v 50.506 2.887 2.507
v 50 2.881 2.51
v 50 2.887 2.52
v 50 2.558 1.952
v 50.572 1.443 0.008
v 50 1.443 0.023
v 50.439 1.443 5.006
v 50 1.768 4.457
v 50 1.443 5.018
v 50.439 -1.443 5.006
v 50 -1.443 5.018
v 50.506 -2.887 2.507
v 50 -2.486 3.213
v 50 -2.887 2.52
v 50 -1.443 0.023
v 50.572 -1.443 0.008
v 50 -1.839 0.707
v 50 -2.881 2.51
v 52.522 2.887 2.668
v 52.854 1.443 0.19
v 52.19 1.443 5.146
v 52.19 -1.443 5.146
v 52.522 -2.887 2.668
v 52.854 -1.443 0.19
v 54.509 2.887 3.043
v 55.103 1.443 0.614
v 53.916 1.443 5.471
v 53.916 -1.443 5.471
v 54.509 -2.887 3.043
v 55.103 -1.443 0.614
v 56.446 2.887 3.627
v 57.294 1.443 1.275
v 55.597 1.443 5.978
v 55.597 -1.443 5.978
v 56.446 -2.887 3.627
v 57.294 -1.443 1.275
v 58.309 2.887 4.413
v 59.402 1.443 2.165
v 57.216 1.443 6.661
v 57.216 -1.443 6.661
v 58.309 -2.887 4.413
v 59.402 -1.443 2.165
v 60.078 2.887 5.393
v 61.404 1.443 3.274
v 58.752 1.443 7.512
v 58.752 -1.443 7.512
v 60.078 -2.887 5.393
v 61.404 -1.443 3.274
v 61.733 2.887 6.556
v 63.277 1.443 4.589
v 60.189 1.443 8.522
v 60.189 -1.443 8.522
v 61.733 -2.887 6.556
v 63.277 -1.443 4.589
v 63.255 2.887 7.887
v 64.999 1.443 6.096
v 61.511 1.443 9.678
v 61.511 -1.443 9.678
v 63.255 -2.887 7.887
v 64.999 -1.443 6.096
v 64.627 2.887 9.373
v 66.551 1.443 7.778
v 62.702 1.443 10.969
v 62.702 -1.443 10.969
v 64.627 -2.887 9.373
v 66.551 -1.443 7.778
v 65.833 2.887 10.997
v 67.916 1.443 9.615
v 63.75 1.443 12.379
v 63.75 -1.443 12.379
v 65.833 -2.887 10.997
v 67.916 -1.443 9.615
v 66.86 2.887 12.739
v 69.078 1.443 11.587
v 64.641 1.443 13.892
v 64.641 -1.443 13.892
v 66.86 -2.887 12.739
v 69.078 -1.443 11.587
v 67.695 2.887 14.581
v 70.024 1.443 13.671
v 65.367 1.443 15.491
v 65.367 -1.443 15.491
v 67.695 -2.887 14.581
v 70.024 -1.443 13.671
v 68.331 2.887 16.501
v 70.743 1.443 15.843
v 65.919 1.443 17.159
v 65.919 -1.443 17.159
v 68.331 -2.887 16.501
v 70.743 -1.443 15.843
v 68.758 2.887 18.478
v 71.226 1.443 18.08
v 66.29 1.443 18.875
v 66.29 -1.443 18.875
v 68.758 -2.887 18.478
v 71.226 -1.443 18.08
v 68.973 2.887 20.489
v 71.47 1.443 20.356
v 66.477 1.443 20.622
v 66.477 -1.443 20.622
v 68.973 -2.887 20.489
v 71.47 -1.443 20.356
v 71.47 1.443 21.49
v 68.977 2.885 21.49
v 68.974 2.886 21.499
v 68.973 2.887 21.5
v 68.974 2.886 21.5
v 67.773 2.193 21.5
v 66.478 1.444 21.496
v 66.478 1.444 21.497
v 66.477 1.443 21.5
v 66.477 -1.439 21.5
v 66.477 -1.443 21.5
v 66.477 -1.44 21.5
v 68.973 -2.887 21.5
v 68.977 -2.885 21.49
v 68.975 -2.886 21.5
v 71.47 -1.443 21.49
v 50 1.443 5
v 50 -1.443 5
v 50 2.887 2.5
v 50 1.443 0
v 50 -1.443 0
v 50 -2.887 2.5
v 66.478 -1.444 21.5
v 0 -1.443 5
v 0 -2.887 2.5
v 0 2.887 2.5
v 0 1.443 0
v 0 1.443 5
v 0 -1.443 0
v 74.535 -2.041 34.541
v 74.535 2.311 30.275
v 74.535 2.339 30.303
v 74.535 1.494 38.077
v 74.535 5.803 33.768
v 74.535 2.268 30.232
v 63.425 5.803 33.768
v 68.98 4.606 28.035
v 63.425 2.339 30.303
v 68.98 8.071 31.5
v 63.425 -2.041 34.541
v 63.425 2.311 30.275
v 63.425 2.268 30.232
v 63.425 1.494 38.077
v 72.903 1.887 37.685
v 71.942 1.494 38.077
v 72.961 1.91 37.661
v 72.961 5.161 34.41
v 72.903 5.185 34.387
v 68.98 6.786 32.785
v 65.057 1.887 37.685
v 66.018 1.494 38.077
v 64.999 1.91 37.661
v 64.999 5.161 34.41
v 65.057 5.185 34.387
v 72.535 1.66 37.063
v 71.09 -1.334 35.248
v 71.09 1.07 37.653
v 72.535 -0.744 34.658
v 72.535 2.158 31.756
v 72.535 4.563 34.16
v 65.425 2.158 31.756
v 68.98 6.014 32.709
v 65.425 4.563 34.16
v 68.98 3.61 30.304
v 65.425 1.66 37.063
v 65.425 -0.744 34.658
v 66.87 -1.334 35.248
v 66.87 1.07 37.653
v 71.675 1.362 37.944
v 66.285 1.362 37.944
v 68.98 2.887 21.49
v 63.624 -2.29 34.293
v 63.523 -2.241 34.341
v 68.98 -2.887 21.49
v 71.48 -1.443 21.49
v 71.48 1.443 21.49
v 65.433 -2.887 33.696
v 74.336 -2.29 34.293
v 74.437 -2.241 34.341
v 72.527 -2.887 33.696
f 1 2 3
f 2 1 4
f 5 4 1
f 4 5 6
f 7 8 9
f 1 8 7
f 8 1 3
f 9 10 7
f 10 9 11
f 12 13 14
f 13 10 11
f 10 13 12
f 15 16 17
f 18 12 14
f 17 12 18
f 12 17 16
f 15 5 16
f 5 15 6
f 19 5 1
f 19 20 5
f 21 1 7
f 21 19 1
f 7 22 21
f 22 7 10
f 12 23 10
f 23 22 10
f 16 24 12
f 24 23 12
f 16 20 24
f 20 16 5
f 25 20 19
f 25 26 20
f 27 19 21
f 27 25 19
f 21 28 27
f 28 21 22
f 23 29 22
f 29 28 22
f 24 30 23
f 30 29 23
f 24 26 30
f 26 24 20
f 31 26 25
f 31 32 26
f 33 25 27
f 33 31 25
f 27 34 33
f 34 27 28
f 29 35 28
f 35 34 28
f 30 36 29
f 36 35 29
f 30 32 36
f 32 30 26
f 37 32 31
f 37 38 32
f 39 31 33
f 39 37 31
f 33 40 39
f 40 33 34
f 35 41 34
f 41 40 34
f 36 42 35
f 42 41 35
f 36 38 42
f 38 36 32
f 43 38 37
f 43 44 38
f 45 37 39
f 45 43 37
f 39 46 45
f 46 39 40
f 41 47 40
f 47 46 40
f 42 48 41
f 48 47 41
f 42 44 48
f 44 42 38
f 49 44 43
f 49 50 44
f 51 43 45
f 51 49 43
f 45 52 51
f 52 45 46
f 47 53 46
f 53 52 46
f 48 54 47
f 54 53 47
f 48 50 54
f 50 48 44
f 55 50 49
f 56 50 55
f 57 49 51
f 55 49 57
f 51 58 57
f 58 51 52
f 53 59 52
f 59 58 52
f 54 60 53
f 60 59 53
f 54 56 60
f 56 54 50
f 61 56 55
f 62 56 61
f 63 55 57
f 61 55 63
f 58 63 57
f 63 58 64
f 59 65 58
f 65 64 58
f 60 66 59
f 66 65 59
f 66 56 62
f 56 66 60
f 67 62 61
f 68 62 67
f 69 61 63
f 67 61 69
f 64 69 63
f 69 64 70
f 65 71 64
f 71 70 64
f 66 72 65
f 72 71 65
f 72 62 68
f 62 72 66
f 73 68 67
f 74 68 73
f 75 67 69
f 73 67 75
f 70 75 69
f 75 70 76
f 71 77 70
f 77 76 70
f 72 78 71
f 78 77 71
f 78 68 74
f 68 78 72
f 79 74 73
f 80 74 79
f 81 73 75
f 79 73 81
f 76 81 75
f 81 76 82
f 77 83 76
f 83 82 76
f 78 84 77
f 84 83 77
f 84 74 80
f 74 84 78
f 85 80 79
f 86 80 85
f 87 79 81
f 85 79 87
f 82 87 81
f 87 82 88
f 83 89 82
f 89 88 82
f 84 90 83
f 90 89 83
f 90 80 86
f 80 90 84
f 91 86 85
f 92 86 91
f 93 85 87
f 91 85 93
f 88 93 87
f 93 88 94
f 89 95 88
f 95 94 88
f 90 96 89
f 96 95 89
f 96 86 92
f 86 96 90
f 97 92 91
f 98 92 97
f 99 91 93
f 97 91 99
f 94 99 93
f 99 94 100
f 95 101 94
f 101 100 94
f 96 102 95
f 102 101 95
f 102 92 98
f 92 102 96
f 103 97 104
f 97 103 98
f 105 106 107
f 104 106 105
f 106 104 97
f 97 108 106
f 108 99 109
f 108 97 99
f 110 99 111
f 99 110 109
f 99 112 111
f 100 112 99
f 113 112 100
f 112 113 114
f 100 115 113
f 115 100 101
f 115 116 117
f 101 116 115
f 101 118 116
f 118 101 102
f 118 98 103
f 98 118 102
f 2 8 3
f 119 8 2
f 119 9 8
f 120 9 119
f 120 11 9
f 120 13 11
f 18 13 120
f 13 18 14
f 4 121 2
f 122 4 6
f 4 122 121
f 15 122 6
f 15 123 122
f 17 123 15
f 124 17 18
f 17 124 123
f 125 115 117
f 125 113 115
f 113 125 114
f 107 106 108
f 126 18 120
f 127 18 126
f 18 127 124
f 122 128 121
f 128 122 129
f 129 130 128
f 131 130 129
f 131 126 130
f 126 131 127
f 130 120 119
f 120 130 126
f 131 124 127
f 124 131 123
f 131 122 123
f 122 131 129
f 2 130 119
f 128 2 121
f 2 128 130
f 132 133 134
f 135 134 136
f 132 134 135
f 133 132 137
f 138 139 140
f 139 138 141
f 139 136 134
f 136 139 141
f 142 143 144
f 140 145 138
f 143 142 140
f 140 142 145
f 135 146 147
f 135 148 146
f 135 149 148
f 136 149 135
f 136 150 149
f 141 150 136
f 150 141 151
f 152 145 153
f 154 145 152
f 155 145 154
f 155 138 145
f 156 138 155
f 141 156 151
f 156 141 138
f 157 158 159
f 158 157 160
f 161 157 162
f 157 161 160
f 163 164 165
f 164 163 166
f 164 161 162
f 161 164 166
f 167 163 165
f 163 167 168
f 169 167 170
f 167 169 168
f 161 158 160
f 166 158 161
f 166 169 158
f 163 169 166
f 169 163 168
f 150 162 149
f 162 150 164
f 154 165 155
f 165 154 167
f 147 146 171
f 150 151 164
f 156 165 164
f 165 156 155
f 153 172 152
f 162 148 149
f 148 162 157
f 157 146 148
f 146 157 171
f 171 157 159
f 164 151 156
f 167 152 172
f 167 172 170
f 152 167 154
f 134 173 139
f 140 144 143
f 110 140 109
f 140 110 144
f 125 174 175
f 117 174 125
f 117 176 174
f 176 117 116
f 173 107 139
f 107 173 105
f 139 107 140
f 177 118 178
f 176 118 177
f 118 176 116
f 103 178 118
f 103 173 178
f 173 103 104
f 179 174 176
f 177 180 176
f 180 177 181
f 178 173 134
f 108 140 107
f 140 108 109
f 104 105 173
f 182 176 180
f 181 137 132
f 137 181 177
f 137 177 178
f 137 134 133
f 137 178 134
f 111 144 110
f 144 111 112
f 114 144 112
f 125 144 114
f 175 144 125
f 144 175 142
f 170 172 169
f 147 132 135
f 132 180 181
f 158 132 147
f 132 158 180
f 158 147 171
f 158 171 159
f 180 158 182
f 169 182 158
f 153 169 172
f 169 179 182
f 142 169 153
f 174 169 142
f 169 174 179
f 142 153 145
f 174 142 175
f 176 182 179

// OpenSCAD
//Special Allen Wrench style Nut Holder
//This holds a locknut in place to get threads started
//8/24/2017 By: David Bunch
//
//CUSTOMIZER VARIABLES

//1. Allen Wrench Size across the Flats
Allen_Handle_Flat = 5;      //[4:4mm, 5:5mm, 6:6mm, 8:8mm, 10:10mm]

//2. Length of Allen Wrench Handle
Allen_Handle_Len = 50;      //[30:5:100]

//3. Straight or Curved Handle
Handle_Type = 1;            //[0:Straight, 1:Curved]

//4. Radius of Allen Wrench Handle
Allen_Curve_Rad = 19;       //[12:1:30]

//5. Dimension across Nut Flats
NutFlat = 6.86;             //[5.55:M3 Nut, 6.86:M4 Nut, 7.86:M5 Nut, 9.83:M6 Nut, 6.35:#4 Nut, 7.94:#5 Nut, 7.94:#6 Nut, 8.73:#8 Nut, 9.53:#10 Nut]

//6. Additional amount to add to Socket opening
Tolerance = .25;            // [-.4:.05:.4]

//7. Height of Socket
Socket_Ht = 5;              //[5:.5:10]

//8. Height of transition of socket to Allen Wrench
Sockt_T_Ht = 4;             //[0:.5:6]

//9. How far to recess Nut socket
Nut_Depth = 4;              //[1:.5:6]

//10. Added height to end of Allen Wrench
Add_Ht = 7;                 //[0:.5:30]

//11. Rotation amount of Socket head
Rot_Head = 45;              //[0:1:60]

//12. Thickness of Socket Wall
Thk = 2;                    //[1.8:.2:4]
                            //(1.65mm minimum recommended)

//13. Slice End for More Clearance
Slice_ON = 1;               //[0:NO, 1:YES]

//14. Add Socket (In case you only want an Allen Wrench)
Socket_ON = 1;               //[0:NO, 1:YES]
/* [Hidden] */

//#4 thru #10 Nut dimensions taken from:
//https://www.boltdepot.com/Hex_machine_screw_nuts_Zinc_plated_steel.aspx?nv=l

Al_C_Rad = Handle_Type * Allen_Curve_Rad;       //How to get 0 radius for straight handle
Allen_Handle_Flat_Rad = Allen_Handle_Flat / 2;
Allen_Handle_OD = ((Allen_Handle_Flat / 2) /cos(30)) * 2;
Allen_Handle_Rad = Allen_Handle_OD / 2;
Allen_Curve_Res = Allen_Curve_Rad * 3.14;
echo(Allen_Curve_Res = Allen_Curve_Res);

Nut_Flat_OD = NutFlat + Tolerance;      //Add Tolerance fit to OD across Flat sides of Nut
Out_Flat_OD = Nut_Flat_OD + Thk + Thk;  //Outside Diameter
Out_Flat_Rad = Out_Flat_OD / 2;
Flat_Rad = Nut_Flat_OD / 2;
Nut_OD = (Flat_Rad /cos(30)) * 2;       //Diameter of 6 sided Nut we are holding
Out_OD = (Out_Flat_Rad /cos(30)) * 2;   //Outside of Socket Diameter
Allen_Curve_OD = Allen_Curve_Rad * 2;
echo(Nut_Flat_OD = Nut_Flat_OD);
echo(Nut_OD = Nut_OD);
echo(Out_OD = Out_OD);
echo(Allen_Handle_OD = Allen_Handle_OD);
echo(Allen_Handle_Flat_Rad = Allen_Handle_Flat_Rad);
$fn=24;
//Transition of the Socket to the Allen Wrench
module Socket_Trans()
{
    hull()
    {
        rotate([-Rot_Head,0,0])
        rotate([0,0,30])
        cylinder(d=Out_OD,h=.1,$fn=6);
        translate([0,0,-Sockt_T_Ht-Add_Ht-.01])
        rotate([0,0,Handle_Type*30])
        cylinder(d=Allen_Handle_OD,h=Add_Ht+.01,$fn=6);
    }
}
//Create the Socket End
module Socket_End()
{
    difference()
    {
        union()
        {
            rotate([-Rot_Head,0,0])
            difference()
            {
                union()
                {
                    difference()
                    {
                        rotate([0,0,30])
                        cylinder(d=Out_OD,h=Socket_Ht,$fn=6);
                        translate([0,0,Socket_Ht-Nut_Depth])
                        rotate([0,0,30])
                        cylinder(d=Nut_OD,h=Nut_Depth+1,$fn=6);
                        translate([0,0,Socket_Ht-.6])
                        rotate([0,0,30])
                        cylinder(d1=Nut_OD,d2=Nut_OD+1,h=.61,$fn=6);
                    }
                }
            }
            Socket_Trans();
        }
        if (Rot_Head > 0)
        {
            if (Slice_ON == 1)
            {
                rotate([-Rot_Head,0,0])
                translate([-Out_OD/2,-Out_OD-(Allen_Handle_OD/2),-Sockt_T_Ht-1])
                cube([Out_OD,Out_OD,Socket_Ht+Sockt_T_Ht+2]);
            }
        }
    }
}
module SP_AllenWrench()
{
    difference()
    {
        union()
        {
//Draw the Allen Wrench Handle with the 90 degree curve
            rotate([-90,0,0])
            {
                rotate([0,90,0])
                cylinder(d=Allen_Handle_OD,h=Allen_Handle_Len,$fn=6);
                translate([Allen_Handle_Len,-Allen_Curve_Rad,0])
                if (Handle_Type == 1)
                {
                    difference()
                    {
                        rotate_extrude(angle=360, convexity=10,$fn=Allen_Curve_Res)
                        translate([Allen_Curve_Rad,0,0])
                        rotate([0,0,30])
                        circle(d=Allen_Handle_OD,$fn=6);
//workardound for Thingiverse customizer not liking partial rotate_extrudes
                        translate([-Allen_Curve_OD,-Allen_Curve_OD,-Allen_Handle_OD])
                        cube([Allen_Curve_OD,Allen_Curve_OD*2,Allen_Handle_OD*2]);
                        translate([-1,-Allen_Curve_OD,-Allen_Handle_OD])
                        cube([Allen_Curve_OD,Allen_Curve_OD,Allen_Handle_OD*2]);
                    }
                }
            }
            if (Socket_ON == 1)
            {
//Add the Socket end to the top of the Allen Wrench part
                {
                    if (Handle_Type == 1)
                    {
                        translate([Allen_Handle_Len+Al_C_Rad-.02,0,Al_C_Rad+Sockt_T_Ht+Add_Ht])
                        difference()
                        {
                            Socket_End();
//Cut again after rotating
                            if (Slice_ON == 1)
                            {
                                translate([-Out_OD/2,-Out_OD-(Allen_Handle_OD/2),-Sockt_T_Ht-Add_Ht-1])
                                cube([Out_OD,Out_OD,Socket_Ht+Sockt_T_Ht+Add_Ht+2]);
                            }
                        }
                    } else
                    {
                translate([Allen_Handle_Len+Sockt_T_Ht+Add_Ht,0,0])
                        rotate([0,90,0])
                        rotate([0,0,90])
                        difference()
                        {
                            Socket_End();
//Cut again after rotating
                            if (Slice_ON == 1)
                            {
                                translate([-Out_OD/2,-Out_OD-(Allen_Handle_OD/2),-Sockt_T_Ht-Add_Ht-1])
                                cube([Out_OD,Out_OD,Socket_Ht+Sockt_T_Ht+Add_Ht+2]);
                            }
                        }
                    }
                }
            } else
            {
                if (Handle_Type == 1)
                {
                    translate([Allen_Handle_Len+Allen_Curve_Rad-.02,0,Allen_Curve_Rad+Sockt_T_Ht+Add_Ht])
                    translate([0,0,-Sockt_T_Ht-Add_Ht])
                    rotate([0,0,30])
                    cylinder(d=Allen_Handle_OD,h=Add_Ht,$fn=6);
                }
            }
            
        }
        translate([0,0,-(Allen_Handle_Flat / 2)-5])
        cylinder(d=Allen_Handle_Len*4,h=5,$fn=12);
    }
}
//Move the wrench up to build platform
translate([0,0,Allen_Handle_Flat/2])
SP_AllenWrench();
